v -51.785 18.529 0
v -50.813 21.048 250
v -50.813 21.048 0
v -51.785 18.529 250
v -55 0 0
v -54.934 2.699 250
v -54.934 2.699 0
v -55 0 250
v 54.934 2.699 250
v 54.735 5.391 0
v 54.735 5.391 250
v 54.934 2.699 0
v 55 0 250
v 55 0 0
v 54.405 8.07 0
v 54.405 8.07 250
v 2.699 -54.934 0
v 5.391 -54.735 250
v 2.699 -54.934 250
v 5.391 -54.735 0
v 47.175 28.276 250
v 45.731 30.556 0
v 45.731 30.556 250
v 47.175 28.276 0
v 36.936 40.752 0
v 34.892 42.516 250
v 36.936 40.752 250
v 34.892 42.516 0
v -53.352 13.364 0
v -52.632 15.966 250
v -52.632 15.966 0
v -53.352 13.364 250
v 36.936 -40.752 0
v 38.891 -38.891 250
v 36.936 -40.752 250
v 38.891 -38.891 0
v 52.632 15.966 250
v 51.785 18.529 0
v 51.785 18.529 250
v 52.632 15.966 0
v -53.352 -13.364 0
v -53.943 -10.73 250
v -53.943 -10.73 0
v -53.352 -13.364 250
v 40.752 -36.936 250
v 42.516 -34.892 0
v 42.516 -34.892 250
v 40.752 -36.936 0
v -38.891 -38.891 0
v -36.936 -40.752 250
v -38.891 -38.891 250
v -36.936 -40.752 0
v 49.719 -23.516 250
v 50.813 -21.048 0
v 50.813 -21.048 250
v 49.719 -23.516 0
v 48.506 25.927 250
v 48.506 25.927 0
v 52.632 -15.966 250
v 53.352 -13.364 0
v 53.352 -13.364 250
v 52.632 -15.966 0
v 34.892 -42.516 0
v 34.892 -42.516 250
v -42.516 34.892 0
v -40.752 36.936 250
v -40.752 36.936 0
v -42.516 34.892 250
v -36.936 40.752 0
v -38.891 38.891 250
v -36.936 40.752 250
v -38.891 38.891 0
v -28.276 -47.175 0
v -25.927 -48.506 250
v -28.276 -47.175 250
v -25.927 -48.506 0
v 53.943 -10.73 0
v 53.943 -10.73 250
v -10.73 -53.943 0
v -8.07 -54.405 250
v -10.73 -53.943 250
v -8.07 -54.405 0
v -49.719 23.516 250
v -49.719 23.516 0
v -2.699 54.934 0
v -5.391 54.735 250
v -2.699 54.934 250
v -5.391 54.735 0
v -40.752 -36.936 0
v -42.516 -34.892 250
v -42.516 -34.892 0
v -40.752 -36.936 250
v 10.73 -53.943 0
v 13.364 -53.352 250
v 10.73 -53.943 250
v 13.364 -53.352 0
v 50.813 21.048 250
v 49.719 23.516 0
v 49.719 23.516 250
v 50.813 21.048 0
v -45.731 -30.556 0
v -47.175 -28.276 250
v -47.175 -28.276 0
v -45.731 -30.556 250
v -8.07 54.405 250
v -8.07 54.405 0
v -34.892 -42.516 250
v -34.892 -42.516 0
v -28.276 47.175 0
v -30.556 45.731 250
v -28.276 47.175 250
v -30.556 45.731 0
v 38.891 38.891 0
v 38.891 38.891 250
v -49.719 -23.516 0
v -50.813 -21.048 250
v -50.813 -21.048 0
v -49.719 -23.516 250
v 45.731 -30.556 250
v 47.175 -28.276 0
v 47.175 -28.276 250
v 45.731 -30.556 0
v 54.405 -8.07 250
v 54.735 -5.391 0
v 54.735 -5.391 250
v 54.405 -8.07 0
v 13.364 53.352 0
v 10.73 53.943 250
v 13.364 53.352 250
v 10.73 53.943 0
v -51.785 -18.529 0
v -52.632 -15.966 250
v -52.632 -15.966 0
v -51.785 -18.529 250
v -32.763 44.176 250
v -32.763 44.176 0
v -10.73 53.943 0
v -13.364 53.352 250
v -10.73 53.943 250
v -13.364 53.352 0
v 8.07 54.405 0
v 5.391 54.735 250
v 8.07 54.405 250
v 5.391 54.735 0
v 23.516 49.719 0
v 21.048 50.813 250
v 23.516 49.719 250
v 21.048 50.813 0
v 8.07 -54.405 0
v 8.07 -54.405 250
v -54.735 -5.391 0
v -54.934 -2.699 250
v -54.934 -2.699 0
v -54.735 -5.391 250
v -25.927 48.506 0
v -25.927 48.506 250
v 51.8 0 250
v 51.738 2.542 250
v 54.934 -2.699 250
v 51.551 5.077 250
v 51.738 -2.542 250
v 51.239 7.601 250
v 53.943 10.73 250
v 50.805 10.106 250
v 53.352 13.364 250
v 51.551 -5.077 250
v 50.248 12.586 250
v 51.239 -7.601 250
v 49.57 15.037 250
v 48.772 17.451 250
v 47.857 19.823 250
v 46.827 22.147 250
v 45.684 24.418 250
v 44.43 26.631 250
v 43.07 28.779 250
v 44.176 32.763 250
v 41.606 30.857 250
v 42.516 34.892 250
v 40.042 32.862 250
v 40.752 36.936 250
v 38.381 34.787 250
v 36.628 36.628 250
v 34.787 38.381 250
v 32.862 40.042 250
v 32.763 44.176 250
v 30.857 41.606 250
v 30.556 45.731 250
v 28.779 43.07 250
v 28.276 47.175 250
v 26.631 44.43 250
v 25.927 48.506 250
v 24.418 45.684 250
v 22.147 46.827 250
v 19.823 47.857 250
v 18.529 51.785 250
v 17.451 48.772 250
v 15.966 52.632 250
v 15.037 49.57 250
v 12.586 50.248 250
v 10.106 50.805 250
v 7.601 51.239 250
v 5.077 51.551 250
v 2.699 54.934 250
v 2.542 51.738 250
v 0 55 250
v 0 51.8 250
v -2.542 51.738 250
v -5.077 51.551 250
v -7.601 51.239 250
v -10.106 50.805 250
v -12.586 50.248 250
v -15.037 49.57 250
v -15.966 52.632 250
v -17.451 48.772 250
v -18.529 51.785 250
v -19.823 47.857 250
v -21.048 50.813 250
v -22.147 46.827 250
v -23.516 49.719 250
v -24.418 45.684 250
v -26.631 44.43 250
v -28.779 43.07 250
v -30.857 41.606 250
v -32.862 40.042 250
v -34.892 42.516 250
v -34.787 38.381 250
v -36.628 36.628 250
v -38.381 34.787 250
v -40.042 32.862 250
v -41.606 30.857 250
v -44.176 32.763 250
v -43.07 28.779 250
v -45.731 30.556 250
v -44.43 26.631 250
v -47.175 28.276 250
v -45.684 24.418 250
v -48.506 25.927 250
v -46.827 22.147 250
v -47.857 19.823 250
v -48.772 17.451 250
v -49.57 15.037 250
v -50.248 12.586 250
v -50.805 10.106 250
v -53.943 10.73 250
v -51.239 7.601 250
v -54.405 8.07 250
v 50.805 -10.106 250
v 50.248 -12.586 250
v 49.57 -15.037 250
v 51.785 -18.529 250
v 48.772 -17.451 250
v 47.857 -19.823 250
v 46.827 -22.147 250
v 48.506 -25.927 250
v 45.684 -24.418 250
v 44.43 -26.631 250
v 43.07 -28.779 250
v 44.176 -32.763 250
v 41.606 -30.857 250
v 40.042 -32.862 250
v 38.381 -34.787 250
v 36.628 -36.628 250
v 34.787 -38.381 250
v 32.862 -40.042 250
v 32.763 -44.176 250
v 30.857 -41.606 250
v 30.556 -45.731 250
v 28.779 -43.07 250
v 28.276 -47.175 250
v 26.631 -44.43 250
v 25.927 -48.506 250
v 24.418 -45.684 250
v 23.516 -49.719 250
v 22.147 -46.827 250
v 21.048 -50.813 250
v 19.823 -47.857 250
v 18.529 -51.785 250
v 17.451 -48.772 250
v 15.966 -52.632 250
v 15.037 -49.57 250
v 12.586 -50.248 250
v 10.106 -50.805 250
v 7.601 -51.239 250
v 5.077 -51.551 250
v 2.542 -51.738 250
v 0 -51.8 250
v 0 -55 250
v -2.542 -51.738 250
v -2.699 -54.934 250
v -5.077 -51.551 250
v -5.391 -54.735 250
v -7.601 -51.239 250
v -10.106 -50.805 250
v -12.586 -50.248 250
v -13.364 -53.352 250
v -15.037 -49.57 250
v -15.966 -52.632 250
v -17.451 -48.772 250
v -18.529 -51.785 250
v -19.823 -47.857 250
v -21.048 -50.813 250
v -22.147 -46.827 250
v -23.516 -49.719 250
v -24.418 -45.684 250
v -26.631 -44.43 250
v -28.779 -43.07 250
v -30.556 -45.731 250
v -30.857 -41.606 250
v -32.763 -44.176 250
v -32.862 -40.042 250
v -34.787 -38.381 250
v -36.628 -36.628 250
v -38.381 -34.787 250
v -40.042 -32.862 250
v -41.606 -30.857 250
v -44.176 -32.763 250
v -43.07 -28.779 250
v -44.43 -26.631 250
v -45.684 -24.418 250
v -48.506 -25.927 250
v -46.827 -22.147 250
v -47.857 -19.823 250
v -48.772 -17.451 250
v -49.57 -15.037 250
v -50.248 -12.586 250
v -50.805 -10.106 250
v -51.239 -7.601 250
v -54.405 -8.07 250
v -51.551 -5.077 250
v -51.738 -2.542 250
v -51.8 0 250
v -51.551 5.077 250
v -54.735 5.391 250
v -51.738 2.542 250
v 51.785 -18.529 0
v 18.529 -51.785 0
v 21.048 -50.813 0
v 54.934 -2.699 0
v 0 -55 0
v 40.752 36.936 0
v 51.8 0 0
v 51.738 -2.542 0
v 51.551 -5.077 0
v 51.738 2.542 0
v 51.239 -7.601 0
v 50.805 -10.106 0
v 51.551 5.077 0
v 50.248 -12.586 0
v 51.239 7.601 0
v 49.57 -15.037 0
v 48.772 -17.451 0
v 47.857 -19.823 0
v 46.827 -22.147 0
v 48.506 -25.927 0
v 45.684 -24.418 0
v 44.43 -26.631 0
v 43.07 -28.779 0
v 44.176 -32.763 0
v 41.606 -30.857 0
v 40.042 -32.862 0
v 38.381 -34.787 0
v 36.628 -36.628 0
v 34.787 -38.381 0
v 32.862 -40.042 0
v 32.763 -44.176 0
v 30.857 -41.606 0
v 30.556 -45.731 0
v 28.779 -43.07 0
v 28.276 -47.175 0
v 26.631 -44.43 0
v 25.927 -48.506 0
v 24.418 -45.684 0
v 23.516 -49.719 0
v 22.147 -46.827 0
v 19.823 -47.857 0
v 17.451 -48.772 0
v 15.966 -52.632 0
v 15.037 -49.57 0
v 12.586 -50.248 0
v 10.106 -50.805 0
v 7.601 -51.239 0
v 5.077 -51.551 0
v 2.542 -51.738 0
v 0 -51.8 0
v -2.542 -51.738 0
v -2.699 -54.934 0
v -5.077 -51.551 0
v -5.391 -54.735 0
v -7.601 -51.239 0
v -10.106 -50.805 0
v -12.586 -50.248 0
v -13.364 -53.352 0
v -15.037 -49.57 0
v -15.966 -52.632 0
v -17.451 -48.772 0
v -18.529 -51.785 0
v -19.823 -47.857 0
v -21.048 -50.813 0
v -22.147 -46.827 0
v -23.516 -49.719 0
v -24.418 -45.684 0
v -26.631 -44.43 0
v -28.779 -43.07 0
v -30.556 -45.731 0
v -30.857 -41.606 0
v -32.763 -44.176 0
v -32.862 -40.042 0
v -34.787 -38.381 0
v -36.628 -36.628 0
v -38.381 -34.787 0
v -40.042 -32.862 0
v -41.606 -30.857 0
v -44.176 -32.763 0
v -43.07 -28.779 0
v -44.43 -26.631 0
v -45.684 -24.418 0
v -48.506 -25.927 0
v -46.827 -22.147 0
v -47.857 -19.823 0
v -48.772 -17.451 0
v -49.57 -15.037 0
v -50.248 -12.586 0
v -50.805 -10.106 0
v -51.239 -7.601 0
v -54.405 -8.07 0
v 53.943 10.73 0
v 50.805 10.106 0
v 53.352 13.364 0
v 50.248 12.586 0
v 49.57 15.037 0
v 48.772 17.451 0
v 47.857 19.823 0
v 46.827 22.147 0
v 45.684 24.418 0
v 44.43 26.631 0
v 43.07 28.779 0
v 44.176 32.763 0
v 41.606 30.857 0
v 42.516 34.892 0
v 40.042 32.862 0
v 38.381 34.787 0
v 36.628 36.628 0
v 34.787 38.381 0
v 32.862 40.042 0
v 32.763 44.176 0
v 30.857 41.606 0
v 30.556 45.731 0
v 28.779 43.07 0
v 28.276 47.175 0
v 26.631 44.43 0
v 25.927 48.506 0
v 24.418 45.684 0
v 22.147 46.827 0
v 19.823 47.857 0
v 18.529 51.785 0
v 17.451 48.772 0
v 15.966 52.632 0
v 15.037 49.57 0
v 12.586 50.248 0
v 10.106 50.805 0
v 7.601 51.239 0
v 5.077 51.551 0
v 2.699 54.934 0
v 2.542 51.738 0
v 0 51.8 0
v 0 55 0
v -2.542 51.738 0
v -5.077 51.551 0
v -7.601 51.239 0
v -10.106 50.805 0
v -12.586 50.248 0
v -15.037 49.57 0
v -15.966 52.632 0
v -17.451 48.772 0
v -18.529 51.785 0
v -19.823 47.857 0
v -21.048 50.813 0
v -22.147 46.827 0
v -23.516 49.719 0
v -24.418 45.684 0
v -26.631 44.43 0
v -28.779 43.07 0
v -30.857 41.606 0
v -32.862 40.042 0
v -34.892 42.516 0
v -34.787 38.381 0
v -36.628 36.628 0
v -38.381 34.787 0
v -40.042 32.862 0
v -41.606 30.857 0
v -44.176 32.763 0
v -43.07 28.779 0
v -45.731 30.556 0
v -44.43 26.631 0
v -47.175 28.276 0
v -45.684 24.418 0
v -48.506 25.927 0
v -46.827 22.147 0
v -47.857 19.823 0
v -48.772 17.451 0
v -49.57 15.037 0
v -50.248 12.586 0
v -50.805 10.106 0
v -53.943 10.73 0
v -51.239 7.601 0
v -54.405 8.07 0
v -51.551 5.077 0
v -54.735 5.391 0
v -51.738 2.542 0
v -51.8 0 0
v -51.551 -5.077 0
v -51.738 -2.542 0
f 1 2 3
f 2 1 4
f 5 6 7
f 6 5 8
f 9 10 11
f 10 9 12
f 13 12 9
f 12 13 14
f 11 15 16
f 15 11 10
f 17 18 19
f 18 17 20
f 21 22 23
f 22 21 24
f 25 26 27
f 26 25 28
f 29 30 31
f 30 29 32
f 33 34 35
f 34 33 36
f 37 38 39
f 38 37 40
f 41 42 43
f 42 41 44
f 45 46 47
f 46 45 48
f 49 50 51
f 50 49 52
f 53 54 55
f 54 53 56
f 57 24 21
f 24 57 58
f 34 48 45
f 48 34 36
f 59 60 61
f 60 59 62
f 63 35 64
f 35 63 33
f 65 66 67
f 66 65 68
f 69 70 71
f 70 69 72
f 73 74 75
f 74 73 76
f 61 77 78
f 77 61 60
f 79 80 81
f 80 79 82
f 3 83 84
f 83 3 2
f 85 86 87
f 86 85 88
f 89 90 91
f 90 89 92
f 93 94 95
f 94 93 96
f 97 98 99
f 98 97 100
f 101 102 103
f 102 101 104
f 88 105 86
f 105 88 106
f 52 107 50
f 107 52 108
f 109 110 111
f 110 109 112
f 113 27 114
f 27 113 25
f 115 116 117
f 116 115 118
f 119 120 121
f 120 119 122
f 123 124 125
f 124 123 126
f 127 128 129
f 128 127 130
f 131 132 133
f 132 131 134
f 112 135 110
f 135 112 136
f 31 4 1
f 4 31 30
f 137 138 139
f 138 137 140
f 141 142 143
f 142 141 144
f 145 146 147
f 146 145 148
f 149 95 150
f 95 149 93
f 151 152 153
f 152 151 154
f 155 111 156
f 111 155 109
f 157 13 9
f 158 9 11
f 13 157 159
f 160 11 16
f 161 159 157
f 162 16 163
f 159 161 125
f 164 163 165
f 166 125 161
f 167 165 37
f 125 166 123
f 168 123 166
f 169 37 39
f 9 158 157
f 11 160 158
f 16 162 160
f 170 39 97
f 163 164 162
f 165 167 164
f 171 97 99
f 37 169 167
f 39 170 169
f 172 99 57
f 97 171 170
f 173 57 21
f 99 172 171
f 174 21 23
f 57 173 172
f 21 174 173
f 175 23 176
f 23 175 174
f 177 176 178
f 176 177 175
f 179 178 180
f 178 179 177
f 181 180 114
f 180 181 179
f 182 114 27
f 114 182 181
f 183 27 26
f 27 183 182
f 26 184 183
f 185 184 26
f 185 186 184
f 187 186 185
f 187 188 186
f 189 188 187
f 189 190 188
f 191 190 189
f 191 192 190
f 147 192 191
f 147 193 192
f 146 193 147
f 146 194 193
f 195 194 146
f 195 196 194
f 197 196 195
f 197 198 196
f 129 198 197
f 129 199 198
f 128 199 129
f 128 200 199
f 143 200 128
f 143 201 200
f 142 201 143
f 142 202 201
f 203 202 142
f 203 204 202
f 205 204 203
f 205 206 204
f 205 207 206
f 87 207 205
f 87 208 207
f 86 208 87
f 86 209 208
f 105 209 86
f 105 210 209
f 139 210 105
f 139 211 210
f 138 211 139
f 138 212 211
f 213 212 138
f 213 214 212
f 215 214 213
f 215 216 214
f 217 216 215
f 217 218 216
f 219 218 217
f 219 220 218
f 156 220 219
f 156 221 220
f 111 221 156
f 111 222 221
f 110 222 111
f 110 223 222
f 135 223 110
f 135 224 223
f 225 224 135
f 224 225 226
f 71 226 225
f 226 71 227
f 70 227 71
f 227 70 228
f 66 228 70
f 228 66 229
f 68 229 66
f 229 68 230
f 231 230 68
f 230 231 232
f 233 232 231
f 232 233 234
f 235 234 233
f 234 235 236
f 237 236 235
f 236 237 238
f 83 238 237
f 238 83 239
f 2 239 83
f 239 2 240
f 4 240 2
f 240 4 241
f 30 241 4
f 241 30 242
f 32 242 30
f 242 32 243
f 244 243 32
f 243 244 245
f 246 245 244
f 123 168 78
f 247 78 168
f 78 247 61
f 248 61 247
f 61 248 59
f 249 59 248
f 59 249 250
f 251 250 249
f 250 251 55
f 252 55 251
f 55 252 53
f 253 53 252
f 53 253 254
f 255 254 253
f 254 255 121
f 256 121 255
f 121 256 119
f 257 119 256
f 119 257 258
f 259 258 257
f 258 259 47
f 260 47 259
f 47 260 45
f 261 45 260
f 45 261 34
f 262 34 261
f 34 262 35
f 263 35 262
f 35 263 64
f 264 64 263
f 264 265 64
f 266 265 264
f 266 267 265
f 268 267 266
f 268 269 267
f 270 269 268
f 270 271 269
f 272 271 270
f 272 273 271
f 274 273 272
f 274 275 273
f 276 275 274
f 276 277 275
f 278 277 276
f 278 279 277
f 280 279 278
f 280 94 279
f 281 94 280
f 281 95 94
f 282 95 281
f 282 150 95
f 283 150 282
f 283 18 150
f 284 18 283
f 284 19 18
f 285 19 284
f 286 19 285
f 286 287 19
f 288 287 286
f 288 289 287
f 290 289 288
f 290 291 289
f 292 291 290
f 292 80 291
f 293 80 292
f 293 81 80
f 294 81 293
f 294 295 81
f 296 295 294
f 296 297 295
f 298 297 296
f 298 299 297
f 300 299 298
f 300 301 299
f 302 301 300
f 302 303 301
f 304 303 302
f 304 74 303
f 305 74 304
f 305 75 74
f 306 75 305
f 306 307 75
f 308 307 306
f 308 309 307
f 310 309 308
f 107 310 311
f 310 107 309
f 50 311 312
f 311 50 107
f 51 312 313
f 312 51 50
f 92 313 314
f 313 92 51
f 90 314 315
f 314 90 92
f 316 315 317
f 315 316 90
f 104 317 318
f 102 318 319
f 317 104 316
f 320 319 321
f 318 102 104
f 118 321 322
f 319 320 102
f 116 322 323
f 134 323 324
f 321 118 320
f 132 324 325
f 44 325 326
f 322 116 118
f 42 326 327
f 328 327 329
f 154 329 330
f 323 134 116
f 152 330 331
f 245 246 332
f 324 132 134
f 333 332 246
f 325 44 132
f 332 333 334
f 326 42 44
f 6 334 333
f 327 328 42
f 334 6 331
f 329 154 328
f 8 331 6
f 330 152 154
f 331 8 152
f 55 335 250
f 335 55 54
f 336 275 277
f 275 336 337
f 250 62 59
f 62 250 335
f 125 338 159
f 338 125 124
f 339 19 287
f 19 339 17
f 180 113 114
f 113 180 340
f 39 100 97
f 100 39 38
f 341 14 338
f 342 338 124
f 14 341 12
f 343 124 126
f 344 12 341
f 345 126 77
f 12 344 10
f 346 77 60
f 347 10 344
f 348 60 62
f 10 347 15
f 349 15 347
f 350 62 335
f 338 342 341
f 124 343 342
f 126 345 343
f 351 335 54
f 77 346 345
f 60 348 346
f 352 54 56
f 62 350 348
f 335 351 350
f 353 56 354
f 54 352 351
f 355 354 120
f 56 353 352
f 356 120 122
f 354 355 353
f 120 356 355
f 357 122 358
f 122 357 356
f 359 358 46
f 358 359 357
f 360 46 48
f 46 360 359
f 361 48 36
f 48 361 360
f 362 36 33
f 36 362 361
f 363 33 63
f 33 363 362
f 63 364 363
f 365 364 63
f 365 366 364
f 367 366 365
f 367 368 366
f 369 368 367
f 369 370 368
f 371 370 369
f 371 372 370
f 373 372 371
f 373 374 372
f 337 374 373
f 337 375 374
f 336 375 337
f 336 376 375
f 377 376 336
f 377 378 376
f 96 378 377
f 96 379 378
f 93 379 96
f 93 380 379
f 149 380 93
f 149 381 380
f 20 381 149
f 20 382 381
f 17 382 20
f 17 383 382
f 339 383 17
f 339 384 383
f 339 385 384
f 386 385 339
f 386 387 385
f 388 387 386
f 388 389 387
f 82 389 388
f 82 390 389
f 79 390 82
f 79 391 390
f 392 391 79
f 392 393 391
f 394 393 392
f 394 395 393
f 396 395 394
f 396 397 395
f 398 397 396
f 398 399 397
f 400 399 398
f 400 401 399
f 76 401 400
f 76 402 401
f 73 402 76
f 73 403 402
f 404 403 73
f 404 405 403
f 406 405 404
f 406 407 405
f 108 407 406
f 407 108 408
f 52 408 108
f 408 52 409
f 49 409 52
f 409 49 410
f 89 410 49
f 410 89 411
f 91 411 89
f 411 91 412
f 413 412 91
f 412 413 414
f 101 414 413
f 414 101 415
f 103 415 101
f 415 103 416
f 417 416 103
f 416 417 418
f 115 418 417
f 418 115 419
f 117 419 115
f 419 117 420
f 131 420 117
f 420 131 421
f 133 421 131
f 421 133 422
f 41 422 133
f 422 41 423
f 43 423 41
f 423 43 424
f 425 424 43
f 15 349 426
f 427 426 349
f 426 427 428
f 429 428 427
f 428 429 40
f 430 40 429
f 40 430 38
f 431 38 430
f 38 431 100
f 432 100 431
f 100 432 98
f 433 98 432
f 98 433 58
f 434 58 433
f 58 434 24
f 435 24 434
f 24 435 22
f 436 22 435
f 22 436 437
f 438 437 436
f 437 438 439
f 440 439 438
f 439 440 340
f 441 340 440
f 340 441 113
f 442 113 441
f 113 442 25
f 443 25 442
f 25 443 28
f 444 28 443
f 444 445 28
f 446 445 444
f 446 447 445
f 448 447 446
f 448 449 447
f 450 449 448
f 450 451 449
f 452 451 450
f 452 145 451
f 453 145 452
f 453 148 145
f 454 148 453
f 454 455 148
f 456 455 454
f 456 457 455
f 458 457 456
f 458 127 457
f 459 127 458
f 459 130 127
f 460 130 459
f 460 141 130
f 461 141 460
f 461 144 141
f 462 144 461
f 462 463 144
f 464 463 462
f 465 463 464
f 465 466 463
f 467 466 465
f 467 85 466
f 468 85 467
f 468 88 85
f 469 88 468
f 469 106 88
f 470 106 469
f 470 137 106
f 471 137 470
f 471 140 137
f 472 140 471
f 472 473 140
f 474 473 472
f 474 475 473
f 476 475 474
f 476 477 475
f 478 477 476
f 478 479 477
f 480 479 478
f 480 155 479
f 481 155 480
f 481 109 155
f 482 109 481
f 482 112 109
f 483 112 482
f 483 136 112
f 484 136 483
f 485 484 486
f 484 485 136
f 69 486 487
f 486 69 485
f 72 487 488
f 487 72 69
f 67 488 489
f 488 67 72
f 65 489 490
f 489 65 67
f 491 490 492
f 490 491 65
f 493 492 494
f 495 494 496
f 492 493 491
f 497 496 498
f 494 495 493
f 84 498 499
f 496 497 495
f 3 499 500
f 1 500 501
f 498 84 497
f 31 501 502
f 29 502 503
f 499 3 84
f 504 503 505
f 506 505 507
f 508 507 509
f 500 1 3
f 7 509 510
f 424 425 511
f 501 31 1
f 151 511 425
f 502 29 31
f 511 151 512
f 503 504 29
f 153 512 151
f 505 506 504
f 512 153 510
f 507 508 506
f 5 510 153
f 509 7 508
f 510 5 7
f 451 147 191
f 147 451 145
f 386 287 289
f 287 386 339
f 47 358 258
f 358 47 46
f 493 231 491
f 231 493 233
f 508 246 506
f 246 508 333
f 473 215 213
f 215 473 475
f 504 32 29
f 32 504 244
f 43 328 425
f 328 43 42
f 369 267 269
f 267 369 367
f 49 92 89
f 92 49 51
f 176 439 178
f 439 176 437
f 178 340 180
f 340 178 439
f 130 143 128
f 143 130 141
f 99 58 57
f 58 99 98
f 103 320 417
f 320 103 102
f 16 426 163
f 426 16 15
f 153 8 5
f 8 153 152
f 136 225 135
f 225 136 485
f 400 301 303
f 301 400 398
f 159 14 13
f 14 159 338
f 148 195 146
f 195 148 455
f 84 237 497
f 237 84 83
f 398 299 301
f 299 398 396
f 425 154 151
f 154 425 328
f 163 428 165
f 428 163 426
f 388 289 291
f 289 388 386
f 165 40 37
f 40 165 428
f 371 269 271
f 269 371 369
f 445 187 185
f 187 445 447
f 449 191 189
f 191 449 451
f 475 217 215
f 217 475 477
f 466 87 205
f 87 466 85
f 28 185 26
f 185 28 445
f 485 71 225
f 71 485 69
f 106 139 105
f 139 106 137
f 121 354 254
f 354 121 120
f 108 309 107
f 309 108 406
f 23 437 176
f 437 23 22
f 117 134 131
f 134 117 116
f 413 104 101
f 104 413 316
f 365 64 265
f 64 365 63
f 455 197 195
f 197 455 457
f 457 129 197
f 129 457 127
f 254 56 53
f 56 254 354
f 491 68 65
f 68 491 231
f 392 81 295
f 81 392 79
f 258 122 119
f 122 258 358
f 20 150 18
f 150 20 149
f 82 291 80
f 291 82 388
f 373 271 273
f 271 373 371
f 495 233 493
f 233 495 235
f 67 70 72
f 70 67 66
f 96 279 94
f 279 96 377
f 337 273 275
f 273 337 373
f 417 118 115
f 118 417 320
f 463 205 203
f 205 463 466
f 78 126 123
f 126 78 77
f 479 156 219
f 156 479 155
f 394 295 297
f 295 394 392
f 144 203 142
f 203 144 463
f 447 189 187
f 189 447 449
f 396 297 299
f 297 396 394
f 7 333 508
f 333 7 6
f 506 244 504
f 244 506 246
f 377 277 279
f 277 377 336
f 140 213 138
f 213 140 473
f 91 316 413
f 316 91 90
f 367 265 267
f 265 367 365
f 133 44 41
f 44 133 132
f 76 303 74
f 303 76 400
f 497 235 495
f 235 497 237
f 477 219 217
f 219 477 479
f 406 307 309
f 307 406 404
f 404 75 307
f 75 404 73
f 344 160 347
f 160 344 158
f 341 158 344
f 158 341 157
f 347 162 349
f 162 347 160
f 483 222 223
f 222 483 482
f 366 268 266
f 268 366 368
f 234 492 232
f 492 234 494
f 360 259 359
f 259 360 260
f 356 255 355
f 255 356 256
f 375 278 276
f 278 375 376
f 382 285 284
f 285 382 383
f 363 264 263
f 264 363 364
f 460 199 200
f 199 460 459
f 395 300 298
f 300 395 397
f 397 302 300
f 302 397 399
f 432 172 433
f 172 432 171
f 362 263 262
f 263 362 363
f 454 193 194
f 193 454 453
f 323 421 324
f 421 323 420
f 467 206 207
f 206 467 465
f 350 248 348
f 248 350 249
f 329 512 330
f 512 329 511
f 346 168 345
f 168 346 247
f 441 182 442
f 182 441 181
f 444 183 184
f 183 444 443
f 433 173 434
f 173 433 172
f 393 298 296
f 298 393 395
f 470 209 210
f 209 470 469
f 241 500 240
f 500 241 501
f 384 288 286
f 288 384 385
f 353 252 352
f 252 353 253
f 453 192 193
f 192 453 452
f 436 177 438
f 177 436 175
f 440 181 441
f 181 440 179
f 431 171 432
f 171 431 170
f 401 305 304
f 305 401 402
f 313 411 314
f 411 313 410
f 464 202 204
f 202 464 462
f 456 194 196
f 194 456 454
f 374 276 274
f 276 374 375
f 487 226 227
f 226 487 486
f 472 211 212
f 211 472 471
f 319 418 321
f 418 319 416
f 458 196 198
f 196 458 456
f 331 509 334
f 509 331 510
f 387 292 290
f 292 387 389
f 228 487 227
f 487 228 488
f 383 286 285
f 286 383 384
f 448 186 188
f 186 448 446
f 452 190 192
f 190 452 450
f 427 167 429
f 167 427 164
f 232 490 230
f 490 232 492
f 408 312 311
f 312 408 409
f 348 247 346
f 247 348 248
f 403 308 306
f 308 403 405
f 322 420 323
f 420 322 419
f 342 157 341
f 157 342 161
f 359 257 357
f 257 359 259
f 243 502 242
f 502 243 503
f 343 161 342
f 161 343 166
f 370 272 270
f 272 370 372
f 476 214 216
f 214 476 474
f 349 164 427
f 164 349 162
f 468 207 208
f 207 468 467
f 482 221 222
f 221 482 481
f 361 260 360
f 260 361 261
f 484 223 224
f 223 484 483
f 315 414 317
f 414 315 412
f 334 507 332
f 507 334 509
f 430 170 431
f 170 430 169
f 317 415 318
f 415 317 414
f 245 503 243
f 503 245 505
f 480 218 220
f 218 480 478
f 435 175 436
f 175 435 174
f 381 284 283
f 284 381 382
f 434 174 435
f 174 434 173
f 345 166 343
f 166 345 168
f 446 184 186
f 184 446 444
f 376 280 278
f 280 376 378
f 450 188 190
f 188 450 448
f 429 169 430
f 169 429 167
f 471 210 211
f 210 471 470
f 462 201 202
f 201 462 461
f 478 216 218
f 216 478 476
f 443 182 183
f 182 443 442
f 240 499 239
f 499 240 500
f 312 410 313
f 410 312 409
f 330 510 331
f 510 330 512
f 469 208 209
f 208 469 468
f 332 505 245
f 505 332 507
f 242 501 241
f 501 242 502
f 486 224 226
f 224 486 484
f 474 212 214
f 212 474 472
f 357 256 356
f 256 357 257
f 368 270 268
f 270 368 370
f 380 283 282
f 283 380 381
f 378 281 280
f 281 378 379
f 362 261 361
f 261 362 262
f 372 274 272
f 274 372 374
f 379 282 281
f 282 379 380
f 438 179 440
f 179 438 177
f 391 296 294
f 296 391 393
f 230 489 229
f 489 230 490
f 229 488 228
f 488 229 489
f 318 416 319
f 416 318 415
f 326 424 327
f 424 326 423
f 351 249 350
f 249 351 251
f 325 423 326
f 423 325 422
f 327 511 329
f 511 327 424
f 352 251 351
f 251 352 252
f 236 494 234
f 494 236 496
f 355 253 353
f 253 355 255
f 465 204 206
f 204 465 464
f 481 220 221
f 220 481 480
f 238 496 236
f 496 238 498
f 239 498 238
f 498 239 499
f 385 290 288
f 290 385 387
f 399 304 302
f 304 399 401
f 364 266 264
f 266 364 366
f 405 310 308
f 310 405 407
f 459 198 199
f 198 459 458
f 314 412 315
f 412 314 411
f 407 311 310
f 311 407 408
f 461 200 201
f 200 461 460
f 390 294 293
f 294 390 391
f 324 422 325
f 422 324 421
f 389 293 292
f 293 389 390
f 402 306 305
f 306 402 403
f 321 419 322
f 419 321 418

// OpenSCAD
$fn = 128;

// HT pipe parameters (approximate for HT 110)
outer_d = 110;          // mm
wall_thickness = 3.2;   // mm (typical)
length = 250;           // mm

inner_d = outer_d - 2*wall_thickness;

difference() {
    cylinder(h = length, d = outer_d);
    translate([0,0,-0.1])
        cylinder(h = length + 0.2, d = inner_d);
}
